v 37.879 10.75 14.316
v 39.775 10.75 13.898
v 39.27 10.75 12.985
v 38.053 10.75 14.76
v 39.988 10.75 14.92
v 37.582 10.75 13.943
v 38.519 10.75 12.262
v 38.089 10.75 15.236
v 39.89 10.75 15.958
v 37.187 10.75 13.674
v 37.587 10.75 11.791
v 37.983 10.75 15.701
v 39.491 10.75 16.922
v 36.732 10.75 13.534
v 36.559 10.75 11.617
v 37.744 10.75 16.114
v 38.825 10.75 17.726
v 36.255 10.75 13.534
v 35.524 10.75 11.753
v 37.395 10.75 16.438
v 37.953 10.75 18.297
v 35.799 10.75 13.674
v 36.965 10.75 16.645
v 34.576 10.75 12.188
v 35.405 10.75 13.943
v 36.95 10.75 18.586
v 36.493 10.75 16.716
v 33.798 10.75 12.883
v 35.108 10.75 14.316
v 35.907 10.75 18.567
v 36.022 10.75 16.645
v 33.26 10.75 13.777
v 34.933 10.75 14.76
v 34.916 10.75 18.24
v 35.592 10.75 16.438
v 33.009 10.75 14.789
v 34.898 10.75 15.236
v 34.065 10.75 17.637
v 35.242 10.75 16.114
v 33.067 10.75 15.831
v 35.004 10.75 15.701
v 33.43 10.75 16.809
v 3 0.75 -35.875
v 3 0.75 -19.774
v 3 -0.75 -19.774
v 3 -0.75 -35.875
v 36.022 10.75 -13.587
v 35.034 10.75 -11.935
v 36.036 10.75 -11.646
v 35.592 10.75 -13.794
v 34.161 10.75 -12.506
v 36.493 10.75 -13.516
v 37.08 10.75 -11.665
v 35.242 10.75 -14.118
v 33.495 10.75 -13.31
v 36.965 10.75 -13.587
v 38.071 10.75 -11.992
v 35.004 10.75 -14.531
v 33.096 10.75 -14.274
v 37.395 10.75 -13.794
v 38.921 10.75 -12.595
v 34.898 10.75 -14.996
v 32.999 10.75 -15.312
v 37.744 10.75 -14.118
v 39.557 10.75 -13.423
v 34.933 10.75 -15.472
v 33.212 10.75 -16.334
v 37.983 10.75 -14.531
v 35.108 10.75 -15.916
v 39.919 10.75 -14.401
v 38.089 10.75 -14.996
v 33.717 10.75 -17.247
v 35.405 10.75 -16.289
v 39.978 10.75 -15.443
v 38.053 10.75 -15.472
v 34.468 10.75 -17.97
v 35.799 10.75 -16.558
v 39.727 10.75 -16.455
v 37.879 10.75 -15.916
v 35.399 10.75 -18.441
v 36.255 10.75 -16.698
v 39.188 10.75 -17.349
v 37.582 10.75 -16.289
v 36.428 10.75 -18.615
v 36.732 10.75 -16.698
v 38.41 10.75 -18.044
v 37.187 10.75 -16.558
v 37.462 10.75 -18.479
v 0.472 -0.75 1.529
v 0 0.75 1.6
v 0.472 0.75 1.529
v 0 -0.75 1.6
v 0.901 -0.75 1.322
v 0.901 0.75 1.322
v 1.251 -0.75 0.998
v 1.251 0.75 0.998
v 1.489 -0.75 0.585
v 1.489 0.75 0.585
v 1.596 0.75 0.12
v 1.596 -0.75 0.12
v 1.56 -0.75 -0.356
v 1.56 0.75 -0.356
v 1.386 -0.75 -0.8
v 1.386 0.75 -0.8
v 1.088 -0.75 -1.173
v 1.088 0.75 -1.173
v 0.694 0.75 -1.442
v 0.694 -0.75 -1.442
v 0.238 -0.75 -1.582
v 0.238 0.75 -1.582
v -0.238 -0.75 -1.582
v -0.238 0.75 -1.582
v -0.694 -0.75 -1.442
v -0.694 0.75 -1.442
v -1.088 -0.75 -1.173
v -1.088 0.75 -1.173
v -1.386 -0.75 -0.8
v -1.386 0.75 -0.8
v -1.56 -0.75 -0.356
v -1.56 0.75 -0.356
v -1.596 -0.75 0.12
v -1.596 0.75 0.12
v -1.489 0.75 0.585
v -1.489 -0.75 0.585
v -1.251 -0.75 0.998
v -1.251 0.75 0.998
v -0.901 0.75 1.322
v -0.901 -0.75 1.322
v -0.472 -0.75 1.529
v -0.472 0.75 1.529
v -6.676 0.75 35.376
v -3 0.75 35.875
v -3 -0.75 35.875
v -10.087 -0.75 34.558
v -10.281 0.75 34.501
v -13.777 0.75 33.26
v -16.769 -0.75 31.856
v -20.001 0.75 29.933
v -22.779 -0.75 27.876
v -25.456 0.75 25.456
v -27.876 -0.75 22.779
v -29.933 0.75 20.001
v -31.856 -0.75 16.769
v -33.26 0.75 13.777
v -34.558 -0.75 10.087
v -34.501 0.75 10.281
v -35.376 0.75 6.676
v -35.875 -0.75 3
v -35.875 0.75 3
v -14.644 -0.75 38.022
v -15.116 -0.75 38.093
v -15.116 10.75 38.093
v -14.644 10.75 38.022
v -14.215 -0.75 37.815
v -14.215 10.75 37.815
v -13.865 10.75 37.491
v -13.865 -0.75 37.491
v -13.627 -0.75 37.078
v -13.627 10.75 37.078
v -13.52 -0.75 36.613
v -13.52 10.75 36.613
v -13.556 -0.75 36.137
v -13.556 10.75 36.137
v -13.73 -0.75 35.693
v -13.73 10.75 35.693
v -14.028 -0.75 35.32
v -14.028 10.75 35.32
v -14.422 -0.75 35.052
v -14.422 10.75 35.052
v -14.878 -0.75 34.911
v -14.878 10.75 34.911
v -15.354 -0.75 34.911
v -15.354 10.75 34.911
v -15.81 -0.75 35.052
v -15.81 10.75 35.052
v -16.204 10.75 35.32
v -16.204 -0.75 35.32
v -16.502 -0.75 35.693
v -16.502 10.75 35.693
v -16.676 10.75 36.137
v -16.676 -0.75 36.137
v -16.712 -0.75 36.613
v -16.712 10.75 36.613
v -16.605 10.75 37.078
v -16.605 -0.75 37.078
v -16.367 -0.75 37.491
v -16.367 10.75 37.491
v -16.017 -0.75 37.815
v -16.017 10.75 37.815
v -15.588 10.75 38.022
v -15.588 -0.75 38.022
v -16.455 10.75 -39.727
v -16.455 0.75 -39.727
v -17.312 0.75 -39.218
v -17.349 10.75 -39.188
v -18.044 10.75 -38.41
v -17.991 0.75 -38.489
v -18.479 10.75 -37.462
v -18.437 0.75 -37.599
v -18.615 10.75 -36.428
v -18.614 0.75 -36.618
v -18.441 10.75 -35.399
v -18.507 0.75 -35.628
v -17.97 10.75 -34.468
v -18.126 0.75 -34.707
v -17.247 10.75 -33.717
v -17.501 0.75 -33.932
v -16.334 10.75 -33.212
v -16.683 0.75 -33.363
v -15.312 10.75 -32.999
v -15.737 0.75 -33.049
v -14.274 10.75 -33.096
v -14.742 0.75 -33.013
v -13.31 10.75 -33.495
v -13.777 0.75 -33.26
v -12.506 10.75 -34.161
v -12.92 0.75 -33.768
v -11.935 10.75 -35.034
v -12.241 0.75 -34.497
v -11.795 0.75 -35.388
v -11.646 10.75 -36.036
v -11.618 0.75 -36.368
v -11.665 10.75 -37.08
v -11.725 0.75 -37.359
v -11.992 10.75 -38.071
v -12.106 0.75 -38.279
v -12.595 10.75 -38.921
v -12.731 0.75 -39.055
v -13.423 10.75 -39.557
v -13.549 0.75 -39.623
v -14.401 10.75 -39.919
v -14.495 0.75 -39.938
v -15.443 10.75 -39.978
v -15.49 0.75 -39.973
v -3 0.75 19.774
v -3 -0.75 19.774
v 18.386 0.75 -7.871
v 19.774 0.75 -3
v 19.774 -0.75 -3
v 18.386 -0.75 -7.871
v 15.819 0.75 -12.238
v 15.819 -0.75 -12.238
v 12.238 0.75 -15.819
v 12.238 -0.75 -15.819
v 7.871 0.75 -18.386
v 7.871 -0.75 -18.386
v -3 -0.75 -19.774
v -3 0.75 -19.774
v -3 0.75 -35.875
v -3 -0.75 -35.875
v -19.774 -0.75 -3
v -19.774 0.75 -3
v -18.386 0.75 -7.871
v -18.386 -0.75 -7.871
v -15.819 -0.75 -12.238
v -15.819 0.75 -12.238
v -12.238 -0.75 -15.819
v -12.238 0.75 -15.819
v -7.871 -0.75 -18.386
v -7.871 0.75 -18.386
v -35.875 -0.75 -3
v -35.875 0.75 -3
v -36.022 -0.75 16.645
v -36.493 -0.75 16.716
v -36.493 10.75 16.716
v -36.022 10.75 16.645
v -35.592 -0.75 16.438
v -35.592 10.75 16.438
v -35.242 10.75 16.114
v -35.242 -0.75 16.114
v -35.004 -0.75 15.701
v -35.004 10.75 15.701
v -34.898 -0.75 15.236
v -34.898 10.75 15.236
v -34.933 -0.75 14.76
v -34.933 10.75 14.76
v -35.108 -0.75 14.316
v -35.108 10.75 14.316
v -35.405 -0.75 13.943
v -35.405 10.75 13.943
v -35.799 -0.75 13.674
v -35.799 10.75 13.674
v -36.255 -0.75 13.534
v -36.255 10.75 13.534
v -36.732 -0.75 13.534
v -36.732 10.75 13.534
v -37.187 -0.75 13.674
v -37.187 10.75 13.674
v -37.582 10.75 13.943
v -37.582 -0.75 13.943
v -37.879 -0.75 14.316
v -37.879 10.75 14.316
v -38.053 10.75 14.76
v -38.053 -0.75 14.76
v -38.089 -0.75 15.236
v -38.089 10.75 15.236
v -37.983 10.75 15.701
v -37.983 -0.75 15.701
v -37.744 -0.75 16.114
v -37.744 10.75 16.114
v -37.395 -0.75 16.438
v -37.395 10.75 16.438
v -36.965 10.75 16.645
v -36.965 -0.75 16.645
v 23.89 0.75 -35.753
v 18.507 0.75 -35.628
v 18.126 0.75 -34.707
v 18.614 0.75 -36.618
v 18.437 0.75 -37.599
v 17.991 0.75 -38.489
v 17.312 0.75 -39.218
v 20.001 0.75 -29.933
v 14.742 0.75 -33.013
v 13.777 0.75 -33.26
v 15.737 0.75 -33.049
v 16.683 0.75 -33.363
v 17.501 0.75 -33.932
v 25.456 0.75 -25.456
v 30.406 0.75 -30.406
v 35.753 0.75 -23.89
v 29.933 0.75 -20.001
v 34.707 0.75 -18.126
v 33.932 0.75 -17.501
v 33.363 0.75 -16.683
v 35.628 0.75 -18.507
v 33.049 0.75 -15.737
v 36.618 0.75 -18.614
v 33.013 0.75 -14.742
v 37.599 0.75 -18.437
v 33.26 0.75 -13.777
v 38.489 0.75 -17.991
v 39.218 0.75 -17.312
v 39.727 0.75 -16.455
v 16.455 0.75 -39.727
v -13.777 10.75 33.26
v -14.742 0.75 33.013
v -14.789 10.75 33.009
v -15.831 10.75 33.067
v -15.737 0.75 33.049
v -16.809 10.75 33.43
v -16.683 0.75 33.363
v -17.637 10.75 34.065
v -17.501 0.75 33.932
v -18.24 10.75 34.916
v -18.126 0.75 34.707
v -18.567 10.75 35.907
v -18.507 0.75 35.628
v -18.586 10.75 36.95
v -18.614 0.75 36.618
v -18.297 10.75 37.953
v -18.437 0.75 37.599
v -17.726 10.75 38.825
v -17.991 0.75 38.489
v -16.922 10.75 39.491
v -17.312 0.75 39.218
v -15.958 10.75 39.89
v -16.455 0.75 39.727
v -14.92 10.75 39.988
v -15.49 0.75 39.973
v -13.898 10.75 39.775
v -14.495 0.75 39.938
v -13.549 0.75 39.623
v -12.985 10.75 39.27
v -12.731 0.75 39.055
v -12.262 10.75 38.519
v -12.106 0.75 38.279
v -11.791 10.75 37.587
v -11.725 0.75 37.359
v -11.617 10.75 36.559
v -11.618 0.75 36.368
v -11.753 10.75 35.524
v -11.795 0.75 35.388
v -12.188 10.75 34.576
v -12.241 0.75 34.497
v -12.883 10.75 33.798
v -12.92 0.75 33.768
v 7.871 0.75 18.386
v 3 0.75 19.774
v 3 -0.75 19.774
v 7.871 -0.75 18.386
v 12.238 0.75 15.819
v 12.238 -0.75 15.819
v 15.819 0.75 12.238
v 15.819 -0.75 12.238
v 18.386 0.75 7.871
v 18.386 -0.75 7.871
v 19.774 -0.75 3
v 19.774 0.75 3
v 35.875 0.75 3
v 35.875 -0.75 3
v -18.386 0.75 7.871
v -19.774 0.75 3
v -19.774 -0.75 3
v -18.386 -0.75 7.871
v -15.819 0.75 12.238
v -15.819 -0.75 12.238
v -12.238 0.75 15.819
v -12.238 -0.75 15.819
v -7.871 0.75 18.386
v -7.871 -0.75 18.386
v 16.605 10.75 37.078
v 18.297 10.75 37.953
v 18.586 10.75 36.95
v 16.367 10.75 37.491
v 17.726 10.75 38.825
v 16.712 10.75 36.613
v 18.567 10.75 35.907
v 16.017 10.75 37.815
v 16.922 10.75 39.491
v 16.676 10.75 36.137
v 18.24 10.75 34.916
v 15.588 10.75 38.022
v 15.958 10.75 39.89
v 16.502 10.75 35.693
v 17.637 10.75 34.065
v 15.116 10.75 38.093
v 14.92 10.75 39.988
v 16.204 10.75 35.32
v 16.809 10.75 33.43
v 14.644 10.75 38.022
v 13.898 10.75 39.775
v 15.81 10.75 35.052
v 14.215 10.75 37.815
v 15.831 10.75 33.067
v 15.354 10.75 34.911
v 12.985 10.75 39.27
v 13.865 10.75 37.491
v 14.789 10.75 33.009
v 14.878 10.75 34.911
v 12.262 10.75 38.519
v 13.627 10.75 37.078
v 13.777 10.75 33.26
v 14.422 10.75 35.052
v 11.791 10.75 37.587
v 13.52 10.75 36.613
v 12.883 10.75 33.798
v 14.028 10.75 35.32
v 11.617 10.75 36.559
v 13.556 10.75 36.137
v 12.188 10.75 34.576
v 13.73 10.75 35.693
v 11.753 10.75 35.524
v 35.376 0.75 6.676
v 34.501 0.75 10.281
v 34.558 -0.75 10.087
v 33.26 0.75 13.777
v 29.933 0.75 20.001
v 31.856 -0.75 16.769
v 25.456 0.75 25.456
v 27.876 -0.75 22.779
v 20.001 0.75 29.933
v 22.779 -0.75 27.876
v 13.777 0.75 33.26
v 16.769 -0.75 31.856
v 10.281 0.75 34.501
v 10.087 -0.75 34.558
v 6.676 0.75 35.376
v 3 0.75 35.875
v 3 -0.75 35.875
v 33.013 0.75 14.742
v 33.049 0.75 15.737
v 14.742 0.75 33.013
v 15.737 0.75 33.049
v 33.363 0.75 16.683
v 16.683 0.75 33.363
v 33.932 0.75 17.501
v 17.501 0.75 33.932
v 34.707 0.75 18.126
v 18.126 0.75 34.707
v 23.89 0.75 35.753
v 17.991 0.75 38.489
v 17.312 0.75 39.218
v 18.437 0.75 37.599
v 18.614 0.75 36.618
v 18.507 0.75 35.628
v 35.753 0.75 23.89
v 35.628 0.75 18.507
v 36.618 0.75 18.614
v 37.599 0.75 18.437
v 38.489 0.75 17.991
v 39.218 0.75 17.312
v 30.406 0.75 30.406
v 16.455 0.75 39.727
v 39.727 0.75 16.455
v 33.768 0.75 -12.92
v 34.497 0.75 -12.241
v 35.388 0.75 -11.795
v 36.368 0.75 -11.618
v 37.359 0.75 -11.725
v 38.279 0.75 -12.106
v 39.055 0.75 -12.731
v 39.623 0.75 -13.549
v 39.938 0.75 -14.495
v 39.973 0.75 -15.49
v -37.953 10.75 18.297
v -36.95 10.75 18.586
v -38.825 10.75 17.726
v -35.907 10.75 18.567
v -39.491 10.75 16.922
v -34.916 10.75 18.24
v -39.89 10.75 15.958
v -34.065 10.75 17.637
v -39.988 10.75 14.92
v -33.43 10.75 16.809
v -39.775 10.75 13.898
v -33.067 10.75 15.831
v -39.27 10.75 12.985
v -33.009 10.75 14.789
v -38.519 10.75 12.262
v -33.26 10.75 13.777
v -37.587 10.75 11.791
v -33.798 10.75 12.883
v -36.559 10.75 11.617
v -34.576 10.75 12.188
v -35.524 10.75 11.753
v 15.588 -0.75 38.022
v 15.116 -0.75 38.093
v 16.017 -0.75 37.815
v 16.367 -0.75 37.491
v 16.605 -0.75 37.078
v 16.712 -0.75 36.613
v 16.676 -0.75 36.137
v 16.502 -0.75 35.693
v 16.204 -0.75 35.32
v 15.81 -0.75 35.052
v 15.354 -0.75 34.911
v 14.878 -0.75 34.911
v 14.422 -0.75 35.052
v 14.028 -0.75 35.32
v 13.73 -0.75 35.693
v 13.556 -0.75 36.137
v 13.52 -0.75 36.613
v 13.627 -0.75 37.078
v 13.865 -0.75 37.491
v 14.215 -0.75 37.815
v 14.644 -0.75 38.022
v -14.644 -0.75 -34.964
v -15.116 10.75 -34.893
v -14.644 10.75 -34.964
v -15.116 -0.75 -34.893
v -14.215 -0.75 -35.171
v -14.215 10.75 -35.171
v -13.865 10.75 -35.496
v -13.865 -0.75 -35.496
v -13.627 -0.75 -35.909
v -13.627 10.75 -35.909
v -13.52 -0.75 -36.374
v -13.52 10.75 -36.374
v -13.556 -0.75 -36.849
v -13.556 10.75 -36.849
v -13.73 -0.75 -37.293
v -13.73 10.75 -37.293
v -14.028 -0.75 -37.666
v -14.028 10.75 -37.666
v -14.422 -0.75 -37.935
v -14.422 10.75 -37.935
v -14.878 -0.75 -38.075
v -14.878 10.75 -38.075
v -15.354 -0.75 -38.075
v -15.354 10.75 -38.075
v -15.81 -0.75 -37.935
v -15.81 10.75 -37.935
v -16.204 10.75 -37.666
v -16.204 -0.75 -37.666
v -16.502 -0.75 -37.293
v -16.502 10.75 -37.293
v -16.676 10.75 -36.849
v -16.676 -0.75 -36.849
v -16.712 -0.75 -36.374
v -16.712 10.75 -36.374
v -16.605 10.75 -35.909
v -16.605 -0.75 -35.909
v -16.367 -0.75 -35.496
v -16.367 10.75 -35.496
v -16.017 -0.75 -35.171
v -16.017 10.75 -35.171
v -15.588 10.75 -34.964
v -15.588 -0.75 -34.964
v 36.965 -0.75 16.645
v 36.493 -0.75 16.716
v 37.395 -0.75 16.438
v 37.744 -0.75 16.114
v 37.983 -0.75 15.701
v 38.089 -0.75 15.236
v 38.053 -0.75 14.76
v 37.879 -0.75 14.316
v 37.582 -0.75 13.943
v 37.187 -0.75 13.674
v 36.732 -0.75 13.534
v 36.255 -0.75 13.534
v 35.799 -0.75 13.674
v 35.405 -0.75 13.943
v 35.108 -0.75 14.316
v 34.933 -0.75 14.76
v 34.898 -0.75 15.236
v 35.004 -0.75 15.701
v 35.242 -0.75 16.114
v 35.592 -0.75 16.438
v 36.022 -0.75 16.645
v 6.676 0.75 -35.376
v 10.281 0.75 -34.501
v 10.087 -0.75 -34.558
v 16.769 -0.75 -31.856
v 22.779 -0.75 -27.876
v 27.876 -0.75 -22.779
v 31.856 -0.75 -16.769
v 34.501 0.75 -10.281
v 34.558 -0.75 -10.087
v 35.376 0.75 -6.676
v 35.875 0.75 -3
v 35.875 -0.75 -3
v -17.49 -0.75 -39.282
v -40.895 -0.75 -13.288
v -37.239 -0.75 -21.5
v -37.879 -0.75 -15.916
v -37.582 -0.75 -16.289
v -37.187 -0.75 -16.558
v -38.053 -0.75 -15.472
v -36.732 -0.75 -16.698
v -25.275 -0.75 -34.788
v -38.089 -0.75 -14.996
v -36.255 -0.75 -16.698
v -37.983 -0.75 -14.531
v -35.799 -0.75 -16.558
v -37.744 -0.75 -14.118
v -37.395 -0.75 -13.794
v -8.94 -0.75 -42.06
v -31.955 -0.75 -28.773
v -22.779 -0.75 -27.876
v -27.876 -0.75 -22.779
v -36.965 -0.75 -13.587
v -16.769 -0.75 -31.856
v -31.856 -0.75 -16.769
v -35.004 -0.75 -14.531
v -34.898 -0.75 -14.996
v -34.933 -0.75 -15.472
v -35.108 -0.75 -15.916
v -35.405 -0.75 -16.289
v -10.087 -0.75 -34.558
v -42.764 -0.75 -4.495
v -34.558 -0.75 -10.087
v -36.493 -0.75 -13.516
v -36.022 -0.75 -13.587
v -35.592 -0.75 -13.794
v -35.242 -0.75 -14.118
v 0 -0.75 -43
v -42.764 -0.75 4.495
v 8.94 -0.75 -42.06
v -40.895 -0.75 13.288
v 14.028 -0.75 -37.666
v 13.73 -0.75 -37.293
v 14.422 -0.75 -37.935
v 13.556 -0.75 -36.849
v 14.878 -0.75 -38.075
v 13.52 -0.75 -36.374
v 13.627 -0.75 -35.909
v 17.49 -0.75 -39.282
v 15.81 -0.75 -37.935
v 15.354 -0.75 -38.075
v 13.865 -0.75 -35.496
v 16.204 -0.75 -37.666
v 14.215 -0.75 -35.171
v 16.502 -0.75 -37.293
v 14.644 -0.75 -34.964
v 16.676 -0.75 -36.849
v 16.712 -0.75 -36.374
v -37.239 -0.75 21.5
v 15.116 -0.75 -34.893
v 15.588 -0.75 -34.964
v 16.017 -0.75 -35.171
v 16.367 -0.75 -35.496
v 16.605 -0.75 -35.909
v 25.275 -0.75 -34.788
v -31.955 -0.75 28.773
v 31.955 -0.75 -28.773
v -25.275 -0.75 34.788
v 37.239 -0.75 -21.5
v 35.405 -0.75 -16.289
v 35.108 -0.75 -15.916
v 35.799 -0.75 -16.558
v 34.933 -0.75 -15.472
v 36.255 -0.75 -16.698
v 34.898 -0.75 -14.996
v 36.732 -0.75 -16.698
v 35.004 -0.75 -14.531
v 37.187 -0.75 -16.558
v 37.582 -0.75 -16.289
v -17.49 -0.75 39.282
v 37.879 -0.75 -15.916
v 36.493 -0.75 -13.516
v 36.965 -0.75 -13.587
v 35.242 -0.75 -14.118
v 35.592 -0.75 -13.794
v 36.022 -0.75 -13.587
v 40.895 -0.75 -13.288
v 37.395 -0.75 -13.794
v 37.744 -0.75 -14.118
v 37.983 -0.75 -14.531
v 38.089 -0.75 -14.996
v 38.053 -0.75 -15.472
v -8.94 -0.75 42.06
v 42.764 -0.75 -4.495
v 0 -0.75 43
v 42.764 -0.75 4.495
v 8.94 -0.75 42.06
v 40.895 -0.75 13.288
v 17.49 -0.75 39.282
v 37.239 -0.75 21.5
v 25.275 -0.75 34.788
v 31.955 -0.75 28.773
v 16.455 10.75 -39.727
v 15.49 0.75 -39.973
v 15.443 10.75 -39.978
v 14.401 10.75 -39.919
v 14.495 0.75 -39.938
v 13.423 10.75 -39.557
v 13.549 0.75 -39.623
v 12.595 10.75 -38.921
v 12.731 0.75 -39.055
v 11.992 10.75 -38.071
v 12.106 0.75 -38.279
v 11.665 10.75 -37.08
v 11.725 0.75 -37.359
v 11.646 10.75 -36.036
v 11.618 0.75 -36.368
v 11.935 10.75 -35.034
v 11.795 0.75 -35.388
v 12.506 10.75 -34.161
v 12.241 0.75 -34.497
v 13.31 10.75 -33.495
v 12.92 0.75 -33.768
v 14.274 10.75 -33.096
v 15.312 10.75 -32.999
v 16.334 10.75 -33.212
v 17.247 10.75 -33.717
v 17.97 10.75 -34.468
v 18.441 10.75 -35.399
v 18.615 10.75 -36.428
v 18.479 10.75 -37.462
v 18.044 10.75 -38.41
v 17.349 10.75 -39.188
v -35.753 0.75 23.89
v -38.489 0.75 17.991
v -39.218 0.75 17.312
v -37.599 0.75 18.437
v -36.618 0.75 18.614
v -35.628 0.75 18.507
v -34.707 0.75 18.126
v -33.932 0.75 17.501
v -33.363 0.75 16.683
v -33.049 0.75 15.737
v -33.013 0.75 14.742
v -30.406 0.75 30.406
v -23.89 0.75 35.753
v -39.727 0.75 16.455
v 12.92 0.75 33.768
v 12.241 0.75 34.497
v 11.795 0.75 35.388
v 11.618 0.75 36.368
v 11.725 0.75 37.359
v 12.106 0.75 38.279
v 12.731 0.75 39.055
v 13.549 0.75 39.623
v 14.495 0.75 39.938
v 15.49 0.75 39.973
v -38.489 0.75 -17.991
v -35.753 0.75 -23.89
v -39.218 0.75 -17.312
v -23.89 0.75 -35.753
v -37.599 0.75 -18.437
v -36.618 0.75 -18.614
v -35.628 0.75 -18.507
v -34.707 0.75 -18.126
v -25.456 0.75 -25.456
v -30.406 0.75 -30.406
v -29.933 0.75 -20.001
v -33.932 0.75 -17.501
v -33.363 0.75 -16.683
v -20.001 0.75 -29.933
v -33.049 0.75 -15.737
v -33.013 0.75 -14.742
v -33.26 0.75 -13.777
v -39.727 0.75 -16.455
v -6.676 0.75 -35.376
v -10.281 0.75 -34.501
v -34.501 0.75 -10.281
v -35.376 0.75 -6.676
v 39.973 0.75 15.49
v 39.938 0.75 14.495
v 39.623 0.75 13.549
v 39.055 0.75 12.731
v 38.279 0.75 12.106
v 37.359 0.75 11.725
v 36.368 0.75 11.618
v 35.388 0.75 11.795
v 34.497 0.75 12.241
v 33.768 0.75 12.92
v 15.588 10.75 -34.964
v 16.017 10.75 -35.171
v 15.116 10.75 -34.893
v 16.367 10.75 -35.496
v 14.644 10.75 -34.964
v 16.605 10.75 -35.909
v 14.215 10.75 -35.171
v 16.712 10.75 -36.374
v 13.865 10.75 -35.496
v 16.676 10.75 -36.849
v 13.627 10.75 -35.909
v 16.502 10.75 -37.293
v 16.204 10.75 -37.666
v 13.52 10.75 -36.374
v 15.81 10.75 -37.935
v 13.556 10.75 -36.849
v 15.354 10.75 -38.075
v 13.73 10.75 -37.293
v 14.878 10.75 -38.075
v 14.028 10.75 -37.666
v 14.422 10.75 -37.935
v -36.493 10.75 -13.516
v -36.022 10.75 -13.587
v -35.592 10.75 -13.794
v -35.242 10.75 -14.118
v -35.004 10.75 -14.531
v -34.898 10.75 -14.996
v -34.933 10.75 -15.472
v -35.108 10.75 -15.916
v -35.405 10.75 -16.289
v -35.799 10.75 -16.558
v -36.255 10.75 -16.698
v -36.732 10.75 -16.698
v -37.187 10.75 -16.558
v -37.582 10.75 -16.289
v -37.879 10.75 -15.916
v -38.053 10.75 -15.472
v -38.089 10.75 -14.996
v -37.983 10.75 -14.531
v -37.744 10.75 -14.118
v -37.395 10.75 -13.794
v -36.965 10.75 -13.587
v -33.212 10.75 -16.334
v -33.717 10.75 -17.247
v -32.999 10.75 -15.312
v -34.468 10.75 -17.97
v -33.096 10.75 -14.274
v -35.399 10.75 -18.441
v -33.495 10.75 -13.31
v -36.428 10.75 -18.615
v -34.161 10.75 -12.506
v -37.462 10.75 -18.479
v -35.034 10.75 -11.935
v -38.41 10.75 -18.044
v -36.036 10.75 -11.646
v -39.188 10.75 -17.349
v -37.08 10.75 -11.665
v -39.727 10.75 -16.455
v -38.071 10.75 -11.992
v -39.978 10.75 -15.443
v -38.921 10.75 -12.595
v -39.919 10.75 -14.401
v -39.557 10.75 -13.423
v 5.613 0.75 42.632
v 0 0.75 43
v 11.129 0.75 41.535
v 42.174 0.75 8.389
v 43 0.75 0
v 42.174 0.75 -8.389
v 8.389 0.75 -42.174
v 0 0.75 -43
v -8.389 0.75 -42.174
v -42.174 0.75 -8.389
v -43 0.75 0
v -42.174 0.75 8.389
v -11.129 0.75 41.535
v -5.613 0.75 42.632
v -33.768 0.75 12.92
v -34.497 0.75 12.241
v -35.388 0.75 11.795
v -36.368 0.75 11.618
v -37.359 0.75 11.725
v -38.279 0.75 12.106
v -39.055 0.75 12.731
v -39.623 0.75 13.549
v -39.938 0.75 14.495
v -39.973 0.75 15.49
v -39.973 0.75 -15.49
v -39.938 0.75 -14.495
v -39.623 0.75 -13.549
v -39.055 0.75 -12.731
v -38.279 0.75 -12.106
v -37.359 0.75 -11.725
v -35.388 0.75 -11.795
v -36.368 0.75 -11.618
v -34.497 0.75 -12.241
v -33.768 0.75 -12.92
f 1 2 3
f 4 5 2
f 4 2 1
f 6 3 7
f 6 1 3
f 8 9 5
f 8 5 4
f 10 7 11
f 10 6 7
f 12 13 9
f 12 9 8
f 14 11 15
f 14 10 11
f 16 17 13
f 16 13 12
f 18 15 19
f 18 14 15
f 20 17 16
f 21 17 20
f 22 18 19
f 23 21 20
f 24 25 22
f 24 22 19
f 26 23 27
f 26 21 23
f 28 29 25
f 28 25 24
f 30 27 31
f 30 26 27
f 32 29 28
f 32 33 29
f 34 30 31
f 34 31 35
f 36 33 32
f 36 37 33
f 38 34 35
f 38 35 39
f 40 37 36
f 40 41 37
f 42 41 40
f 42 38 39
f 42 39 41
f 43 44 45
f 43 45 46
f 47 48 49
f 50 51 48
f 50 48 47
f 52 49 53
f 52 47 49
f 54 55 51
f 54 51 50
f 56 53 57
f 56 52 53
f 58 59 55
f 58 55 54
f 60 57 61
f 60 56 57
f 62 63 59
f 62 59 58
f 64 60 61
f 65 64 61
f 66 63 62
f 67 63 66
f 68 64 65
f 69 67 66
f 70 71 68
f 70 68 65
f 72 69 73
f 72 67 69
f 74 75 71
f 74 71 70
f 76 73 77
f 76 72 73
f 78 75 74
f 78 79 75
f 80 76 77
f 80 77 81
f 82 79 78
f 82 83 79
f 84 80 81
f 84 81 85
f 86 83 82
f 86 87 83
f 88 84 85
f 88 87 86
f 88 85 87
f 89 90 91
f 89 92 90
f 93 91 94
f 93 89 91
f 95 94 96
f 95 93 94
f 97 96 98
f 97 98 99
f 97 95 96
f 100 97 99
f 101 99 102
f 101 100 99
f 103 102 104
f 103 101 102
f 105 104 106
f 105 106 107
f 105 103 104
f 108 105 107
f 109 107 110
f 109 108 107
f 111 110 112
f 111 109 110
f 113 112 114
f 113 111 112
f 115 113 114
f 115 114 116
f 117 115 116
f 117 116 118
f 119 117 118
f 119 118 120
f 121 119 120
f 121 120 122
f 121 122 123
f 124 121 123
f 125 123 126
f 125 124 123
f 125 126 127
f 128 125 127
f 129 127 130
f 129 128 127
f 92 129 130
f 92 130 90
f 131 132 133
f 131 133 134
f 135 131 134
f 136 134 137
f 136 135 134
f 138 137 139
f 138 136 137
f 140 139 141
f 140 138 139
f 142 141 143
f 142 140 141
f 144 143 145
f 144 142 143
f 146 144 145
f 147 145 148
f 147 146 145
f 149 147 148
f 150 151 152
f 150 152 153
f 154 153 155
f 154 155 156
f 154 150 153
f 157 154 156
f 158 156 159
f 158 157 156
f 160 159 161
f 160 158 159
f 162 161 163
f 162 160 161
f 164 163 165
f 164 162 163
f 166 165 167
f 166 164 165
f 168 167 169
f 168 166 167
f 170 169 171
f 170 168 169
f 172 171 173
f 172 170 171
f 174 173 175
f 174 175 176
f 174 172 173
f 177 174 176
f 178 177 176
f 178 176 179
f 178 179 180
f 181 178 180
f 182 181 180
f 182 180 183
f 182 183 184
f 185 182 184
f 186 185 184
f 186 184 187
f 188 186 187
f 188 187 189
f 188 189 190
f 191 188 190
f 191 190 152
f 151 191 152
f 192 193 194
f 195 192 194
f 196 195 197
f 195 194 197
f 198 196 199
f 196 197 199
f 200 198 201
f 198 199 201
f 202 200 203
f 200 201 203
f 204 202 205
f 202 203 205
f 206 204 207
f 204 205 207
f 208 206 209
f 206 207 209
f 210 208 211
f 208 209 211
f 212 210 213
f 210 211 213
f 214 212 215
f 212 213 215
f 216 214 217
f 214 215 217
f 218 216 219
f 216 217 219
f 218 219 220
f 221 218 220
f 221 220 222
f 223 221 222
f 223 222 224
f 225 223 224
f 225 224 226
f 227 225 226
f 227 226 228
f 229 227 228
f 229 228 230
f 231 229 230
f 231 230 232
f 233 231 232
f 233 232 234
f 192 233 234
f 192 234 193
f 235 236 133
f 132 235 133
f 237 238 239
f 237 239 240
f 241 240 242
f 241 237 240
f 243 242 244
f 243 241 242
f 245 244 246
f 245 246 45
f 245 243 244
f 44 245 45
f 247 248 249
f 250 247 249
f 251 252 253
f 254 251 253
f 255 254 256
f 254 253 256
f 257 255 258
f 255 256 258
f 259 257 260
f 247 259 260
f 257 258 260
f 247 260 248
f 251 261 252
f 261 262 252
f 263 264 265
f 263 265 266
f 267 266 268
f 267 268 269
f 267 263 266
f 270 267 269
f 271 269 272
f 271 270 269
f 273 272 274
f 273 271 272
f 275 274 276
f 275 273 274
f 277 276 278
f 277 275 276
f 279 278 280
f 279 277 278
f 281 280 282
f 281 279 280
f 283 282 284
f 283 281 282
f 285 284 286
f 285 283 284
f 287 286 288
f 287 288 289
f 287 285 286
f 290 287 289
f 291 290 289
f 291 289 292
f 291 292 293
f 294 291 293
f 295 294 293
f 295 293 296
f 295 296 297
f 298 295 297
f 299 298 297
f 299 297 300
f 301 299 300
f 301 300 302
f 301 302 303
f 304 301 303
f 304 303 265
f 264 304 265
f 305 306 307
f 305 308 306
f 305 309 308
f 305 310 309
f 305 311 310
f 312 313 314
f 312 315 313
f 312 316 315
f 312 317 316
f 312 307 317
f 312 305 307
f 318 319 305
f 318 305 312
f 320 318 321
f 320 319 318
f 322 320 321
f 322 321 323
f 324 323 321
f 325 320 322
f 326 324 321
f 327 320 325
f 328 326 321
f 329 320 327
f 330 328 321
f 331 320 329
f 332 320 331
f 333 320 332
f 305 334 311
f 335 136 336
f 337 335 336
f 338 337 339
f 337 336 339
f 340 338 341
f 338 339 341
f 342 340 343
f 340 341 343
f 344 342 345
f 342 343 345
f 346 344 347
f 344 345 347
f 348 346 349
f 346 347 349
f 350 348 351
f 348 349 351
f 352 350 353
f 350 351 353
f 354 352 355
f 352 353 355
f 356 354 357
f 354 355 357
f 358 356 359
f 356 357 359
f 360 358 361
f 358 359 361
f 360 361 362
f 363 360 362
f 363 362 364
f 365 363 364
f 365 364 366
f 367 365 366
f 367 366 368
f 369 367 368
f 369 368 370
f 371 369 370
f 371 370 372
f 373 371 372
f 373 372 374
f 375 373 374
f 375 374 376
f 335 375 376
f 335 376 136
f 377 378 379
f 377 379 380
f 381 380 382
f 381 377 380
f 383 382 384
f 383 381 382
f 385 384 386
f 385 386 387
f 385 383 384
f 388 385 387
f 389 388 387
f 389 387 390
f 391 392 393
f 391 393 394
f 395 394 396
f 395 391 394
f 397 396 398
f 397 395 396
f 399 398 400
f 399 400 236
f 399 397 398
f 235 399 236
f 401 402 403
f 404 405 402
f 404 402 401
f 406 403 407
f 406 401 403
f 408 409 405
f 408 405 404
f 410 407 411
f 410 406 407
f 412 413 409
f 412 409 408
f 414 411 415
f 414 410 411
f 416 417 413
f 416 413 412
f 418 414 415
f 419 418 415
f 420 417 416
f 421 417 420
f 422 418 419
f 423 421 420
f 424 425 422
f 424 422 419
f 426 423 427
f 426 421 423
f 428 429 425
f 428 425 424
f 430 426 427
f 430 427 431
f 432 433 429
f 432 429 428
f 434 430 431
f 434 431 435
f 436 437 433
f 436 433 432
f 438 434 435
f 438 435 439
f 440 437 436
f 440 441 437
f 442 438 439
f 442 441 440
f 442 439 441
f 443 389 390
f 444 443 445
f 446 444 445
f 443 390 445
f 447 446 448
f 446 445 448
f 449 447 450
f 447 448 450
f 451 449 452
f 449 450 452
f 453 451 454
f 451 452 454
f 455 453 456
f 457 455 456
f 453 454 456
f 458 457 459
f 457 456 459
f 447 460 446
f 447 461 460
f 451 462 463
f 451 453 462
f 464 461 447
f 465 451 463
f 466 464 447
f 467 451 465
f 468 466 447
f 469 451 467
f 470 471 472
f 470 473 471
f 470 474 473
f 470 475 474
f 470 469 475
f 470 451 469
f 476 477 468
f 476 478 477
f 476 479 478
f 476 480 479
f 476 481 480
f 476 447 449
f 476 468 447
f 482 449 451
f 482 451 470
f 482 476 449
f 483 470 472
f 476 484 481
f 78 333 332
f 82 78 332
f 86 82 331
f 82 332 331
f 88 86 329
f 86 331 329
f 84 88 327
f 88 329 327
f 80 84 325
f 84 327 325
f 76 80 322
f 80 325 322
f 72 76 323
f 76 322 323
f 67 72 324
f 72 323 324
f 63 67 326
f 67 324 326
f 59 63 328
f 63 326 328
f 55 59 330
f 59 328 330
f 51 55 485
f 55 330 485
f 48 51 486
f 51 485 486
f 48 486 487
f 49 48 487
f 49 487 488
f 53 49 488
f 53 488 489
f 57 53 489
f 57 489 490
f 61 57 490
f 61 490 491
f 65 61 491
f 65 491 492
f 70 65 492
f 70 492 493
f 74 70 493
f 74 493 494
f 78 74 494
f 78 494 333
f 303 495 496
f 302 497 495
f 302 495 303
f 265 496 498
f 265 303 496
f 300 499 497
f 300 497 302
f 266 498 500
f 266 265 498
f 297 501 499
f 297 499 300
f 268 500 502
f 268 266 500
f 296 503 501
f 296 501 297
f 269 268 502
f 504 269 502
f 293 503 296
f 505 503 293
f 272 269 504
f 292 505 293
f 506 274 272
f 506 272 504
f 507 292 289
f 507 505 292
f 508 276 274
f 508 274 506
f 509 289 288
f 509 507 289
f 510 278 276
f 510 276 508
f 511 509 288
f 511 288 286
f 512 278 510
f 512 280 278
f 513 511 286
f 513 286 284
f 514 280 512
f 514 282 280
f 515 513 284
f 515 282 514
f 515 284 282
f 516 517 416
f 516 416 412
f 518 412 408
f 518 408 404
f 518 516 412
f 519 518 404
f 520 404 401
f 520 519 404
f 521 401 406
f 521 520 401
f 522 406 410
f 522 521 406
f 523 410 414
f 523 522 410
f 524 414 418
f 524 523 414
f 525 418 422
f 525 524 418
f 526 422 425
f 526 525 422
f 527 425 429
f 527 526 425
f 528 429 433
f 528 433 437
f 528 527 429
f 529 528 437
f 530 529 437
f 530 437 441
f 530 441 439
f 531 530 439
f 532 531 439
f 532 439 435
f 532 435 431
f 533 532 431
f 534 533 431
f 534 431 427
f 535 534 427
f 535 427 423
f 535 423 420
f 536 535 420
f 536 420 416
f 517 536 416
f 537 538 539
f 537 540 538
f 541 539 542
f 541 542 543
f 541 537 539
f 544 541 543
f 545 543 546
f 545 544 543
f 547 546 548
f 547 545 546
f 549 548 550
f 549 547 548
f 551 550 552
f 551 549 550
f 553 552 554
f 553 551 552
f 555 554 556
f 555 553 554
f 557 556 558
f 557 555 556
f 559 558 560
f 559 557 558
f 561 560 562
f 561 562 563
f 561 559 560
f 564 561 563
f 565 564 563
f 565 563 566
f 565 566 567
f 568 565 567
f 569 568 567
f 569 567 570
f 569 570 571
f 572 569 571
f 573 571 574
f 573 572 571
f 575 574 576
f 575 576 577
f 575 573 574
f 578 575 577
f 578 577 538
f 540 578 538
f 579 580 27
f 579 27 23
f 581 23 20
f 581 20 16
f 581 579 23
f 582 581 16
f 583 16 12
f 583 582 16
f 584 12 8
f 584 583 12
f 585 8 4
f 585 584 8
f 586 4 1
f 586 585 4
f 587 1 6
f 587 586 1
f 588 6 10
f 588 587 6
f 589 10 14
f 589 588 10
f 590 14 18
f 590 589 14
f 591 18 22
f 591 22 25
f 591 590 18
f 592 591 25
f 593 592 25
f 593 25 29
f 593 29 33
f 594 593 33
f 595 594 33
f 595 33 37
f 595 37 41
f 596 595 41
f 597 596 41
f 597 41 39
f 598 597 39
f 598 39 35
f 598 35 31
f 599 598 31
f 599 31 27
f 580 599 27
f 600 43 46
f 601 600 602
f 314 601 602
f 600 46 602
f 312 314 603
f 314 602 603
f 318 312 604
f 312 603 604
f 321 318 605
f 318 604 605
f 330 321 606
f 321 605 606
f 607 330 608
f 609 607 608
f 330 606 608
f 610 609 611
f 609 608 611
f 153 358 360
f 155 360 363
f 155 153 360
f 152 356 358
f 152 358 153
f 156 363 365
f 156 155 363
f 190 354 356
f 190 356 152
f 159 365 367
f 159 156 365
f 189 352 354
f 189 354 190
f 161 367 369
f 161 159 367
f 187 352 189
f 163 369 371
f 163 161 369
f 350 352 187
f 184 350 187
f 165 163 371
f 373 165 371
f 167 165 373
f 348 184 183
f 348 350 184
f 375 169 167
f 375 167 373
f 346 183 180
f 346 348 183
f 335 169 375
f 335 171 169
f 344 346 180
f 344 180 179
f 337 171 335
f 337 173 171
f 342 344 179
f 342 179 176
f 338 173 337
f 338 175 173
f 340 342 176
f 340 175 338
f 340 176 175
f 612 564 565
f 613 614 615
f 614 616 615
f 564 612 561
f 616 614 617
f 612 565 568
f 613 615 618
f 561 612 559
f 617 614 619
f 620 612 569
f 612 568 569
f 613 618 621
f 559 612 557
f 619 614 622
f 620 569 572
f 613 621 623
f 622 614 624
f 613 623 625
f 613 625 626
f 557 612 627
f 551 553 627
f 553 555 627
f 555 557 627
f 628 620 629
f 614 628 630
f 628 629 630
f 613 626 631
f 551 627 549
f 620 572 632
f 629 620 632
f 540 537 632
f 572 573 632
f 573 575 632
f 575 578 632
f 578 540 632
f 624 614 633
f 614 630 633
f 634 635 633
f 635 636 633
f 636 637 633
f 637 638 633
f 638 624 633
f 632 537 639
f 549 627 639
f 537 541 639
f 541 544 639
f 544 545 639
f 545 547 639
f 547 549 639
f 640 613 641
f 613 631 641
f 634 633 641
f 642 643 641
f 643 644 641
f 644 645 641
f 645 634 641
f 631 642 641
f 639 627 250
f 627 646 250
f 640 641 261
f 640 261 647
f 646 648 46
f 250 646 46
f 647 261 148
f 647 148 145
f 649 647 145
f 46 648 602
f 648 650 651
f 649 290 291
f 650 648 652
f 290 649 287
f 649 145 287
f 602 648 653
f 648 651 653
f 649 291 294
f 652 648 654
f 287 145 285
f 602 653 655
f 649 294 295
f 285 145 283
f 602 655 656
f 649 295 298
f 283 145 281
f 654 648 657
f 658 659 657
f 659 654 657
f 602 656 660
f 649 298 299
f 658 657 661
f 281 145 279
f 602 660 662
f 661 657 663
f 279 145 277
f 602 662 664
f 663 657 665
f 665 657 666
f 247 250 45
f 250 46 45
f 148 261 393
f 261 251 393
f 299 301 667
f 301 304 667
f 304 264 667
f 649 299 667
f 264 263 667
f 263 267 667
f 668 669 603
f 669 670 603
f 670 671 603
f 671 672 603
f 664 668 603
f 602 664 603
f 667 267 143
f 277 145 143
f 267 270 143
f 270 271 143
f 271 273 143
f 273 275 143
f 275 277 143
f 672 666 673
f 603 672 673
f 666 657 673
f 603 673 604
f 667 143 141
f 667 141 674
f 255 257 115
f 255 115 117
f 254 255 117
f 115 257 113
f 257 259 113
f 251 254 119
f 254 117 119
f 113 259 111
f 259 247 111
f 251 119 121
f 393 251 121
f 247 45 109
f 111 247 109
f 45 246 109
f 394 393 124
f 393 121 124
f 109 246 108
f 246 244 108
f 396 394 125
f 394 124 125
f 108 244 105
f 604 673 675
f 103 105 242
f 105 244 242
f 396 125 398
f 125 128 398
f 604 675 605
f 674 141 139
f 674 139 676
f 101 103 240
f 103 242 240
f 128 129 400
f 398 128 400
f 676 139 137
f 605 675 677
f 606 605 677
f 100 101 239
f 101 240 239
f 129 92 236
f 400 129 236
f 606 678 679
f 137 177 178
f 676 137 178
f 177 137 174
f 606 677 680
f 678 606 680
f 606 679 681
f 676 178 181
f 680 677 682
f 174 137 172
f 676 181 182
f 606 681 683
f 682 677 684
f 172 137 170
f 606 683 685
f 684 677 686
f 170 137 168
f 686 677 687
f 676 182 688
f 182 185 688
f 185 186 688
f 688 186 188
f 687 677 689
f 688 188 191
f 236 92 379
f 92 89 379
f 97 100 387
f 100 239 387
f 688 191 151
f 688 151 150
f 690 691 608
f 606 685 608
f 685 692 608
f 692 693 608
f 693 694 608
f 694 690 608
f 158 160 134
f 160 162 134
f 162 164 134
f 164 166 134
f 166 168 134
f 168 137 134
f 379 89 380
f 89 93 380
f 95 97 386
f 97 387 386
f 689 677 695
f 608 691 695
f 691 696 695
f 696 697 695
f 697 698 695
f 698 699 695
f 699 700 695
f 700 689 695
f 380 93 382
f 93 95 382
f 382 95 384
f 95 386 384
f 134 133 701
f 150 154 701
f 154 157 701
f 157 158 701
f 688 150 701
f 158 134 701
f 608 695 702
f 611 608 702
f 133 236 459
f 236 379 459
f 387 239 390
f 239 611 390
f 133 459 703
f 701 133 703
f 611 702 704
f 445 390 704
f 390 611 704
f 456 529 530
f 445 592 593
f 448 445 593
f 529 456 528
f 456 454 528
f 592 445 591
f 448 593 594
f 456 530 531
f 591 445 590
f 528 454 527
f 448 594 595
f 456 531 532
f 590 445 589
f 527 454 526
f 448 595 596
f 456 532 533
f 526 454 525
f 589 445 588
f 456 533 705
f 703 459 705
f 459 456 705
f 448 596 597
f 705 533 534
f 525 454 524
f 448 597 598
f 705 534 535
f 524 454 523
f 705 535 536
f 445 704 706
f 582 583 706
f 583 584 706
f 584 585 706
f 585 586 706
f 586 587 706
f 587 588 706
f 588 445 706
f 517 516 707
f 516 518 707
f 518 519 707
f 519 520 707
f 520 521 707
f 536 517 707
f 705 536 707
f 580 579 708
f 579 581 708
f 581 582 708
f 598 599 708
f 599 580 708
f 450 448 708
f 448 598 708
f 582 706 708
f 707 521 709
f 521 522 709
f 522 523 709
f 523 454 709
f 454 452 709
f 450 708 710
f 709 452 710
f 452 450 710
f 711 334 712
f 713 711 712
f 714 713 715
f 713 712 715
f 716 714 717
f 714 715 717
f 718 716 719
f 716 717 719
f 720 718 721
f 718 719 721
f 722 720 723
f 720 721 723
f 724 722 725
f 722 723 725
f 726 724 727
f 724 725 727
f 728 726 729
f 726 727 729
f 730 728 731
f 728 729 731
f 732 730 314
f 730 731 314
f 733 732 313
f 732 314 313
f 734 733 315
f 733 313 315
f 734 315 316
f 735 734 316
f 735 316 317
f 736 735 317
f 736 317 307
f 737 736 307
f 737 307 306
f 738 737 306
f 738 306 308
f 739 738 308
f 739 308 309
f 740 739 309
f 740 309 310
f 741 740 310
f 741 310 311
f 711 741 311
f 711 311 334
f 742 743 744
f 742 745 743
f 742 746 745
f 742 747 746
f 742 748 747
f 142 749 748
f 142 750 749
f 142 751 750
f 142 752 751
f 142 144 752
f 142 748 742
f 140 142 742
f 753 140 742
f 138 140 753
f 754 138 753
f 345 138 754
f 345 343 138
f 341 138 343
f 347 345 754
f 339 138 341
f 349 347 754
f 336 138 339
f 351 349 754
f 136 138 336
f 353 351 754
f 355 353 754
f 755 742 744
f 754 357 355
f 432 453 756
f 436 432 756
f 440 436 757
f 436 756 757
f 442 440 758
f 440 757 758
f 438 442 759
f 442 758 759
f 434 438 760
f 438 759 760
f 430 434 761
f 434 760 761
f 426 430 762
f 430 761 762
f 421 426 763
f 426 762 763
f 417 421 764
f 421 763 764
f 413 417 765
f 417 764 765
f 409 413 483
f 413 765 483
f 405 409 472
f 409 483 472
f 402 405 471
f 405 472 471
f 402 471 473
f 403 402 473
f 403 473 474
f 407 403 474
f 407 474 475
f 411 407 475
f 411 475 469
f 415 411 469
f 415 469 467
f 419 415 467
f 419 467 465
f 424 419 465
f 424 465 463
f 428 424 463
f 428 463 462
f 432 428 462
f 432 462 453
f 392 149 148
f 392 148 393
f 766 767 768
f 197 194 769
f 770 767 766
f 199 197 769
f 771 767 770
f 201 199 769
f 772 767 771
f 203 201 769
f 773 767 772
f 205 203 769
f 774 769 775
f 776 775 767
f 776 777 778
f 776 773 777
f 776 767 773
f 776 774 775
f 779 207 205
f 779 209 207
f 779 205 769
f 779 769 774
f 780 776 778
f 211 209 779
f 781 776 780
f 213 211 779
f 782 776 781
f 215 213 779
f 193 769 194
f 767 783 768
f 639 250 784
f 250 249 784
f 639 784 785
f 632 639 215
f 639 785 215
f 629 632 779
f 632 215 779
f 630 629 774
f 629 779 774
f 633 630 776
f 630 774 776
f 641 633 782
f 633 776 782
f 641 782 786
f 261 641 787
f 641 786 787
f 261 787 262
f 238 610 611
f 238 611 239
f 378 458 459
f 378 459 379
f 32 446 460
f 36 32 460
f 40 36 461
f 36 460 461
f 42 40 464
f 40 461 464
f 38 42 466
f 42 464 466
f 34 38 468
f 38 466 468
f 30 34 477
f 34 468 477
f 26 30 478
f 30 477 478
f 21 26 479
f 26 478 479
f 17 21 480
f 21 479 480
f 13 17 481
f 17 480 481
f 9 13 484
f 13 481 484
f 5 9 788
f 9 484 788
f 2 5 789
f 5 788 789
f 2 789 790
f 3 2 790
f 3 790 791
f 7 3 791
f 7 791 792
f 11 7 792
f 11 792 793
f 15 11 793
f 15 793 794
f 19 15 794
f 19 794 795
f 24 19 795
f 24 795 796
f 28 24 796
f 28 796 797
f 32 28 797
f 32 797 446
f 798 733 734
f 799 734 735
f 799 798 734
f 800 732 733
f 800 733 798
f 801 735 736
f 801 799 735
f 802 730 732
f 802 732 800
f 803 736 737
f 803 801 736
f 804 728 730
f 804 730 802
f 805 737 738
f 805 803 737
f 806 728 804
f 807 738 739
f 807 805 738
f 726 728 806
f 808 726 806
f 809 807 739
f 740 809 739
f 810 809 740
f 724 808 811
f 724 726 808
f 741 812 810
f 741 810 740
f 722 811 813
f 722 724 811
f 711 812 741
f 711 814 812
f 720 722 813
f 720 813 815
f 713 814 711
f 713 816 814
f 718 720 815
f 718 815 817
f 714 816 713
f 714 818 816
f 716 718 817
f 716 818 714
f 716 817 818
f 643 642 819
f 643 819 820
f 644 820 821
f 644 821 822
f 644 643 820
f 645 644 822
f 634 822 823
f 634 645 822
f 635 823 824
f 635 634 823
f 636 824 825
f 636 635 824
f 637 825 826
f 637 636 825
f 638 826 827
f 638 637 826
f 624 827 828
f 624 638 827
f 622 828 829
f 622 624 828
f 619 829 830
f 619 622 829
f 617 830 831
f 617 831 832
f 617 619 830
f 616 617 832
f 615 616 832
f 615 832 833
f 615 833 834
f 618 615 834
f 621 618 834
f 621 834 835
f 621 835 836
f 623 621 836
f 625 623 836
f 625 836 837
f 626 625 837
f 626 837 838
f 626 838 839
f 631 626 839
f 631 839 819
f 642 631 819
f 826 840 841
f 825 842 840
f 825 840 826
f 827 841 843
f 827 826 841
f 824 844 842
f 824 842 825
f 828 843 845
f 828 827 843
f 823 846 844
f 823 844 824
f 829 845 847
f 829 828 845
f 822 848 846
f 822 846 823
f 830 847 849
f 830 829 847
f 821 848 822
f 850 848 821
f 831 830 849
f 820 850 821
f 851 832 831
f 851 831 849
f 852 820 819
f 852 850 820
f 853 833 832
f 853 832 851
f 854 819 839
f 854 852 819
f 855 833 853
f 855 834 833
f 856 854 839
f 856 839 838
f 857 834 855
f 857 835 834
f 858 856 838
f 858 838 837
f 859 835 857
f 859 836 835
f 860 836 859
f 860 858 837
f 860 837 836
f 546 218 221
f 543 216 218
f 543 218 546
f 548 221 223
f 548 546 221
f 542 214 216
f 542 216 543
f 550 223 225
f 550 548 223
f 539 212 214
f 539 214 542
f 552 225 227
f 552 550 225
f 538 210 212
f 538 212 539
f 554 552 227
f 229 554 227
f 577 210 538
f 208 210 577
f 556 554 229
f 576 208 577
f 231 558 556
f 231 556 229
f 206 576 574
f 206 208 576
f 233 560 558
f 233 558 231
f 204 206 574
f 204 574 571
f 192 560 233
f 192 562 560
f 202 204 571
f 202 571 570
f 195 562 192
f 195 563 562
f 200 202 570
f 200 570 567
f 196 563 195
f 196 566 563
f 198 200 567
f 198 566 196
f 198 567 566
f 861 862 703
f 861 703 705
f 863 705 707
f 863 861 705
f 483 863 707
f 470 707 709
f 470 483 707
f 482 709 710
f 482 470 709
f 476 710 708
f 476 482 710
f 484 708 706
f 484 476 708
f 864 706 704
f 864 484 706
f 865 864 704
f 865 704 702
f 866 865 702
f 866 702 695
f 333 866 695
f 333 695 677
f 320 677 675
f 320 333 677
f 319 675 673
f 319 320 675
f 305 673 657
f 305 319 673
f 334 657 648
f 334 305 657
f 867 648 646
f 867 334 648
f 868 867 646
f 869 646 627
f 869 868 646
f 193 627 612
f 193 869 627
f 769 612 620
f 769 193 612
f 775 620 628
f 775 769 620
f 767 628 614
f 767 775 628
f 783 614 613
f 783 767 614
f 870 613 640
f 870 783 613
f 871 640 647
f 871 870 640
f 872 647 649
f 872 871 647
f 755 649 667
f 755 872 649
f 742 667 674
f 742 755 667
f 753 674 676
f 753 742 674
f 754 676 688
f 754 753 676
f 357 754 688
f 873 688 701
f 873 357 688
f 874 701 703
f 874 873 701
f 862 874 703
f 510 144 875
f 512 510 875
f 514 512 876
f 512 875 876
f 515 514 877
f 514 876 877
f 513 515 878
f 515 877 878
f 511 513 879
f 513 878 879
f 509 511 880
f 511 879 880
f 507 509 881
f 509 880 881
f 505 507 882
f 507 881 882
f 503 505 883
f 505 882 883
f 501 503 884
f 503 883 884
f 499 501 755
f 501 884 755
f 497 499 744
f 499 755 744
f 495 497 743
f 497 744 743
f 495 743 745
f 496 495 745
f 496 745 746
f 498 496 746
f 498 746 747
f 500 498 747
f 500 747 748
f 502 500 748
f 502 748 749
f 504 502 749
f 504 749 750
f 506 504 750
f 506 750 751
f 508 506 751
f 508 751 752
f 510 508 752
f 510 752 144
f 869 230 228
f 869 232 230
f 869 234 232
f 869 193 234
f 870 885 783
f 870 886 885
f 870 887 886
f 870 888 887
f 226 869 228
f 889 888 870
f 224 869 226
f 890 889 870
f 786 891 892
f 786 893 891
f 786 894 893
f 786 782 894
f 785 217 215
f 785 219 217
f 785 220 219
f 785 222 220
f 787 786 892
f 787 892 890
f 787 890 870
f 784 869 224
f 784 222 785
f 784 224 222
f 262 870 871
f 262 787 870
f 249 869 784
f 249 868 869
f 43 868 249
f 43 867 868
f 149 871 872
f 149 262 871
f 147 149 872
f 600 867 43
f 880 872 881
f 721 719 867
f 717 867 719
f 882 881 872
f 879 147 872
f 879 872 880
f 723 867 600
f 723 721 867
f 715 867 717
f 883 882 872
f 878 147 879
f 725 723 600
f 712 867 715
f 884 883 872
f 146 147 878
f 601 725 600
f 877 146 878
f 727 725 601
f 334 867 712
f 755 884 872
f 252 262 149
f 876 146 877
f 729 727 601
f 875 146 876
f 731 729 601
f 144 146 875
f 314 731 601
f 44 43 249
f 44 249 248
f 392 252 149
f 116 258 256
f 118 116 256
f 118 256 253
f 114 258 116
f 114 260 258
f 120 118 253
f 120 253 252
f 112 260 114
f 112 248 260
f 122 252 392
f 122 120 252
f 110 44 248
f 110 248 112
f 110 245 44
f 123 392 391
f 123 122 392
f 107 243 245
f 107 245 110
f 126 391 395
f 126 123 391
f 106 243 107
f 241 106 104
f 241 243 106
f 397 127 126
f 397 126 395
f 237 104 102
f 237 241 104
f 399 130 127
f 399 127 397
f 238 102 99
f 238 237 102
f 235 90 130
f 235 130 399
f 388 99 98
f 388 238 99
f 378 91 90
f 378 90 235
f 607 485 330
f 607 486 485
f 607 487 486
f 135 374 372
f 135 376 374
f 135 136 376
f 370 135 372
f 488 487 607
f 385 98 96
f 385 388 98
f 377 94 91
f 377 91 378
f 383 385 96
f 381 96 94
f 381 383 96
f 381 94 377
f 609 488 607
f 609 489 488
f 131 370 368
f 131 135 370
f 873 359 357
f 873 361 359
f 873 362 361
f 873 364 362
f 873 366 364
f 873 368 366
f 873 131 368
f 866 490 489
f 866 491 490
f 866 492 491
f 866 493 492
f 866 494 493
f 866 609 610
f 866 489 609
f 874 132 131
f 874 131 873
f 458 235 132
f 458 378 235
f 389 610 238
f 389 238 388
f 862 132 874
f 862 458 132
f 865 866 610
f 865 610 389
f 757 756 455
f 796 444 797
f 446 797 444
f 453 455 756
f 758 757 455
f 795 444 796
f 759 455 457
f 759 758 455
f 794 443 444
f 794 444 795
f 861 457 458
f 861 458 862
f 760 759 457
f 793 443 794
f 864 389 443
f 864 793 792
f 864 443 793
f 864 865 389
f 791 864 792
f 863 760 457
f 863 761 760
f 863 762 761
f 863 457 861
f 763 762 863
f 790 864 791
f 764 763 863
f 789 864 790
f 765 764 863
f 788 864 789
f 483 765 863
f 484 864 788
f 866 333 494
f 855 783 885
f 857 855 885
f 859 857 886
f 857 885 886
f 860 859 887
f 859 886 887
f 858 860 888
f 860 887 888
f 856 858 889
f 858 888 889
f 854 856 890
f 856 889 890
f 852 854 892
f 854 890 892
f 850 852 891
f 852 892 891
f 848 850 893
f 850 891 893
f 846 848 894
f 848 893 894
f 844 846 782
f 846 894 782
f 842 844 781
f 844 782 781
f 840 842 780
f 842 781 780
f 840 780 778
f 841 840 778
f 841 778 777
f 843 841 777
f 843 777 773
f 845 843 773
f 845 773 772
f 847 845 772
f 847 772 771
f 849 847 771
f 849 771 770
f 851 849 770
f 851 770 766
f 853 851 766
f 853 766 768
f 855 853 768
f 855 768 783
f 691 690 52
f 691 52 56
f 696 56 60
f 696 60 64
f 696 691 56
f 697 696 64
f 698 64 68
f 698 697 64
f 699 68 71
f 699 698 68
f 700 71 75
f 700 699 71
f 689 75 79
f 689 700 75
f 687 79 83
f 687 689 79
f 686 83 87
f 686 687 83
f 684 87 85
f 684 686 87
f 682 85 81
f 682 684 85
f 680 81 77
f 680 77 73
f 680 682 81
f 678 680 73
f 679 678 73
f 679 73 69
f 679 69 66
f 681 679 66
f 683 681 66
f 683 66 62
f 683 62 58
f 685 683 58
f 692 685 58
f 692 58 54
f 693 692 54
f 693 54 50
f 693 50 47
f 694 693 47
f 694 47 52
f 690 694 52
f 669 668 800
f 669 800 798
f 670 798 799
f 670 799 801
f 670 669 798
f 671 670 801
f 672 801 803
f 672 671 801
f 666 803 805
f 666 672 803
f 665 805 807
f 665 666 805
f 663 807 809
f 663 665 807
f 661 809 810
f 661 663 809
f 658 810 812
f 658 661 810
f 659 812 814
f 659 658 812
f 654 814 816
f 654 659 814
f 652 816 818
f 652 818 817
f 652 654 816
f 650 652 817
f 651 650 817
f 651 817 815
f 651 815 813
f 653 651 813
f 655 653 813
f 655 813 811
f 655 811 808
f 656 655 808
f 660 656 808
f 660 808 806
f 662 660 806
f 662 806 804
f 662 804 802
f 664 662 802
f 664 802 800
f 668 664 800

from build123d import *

# Parameters (mm, degrees)
ESBO_O1_R                = 43
ESBO_O1_R_2              = 1.6
RESSALTO_EXTRUS_O1_DEPTH = 0.75
ESBO_O2_R                = 3.5
ESBO_O2_R_2              = 1.6
RESSALTO_EXTRUS_O3_DEPTH = 10


with BuildPart() as part:
    # Esboço1 → Ressalto-extrusão1 (new, symmetric)
    with BuildSketch(Plane(origin=(0, 0, 0), x_dir=(1, 0, 0), z_dir=(0, 1, 0))):
        with Locations(Location((0, 0, 0), (0, 0, 270))):
            Circle(ESBO_O1_R)
        with Locations(Location((-36.493241534, 15.115995578, 0), (0, 0, 270))):
            Circle(ESBO_O1_R_2, mode=Mode.SUBTRACT)
        with Locations(Location((-15.115995578, 36.493241534, 0), (0, 0, 270))):
            Circle(ESBO_O1_R_2, mode=Mode.SUBTRACT)
        with Locations(Location((15.115995578, 36.493241534, 0), (0, 0, 270))):
            Circle(ESBO_O1_R_2, mode=Mode.SUBTRACT)
        with Locations(Location((36.493241534, 15.115995578, 0), (0, 0, 270))):
            Circle(ESBO_O1_R_2, mode=Mode.SUBTRACT)
        with Locations(Location((36.493241534, -15.115995578, 0), (0, 0, 270))):
            Circle(ESBO_O1_R_2, mode=Mode.SUBTRACT)
        with Locations(Location((15.115995578, -36.493241534, 0), (0, 0, 270))):
            Circle(ESBO_O1_R_2, mode=Mode.SUBTRACT)
        with Locations(Location((-15.115995578, -36.493241534, 0), (0, 0, 270))):
            Circle(ESBO_O1_R_2, mode=Mode.SUBTRACT)
        with Locations(Location((-36.493241534, -15.115995578, 0), (0, 0, 270))):
            Circle(ESBO_O1_R_2, mode=Mode.SUBTRACT)
        with Locations(Location((0, 0, 0), (0, 0, 270))):
            Circle(ESBO_O1_R_2, mode=Mode.SUBTRACT)
        with BuildLine():
            Line((-3, 19.773719933), (-3, 35.874782229))
            ThreePointArc((-3, 35.874782229), (-25.455844123, 25.455844123), (-35.874782229, 3))
            Line((-35.874782229, 3), (-19.773719933, 3))
            ThreePointArc((-19.773719933, 3), (-14.142135624, 14.142135624), (-3, 19.773719933))
        make_face(mode=Mode.SUBTRACT)
        with BuildLine():
            Line((3, 19.773719933), (3, 35.874782229))
            ThreePointArc((3, 35.874782229), (25.455844123, 25.455844123), (35.874782229, 3))
            Line((35.874782229, 3), (19.773719933, 3))
            ThreePointArc((19.773719933, 3), (14.142135624, 14.142135624), (3, 19.773719933))
        make_face(mode=Mode.SUBTRACT)
        with BuildLine():
            Line((19.773719933, -3), (35.874782229, -3))
            ThreePointArc((35.874782229, -3), (25.455844123, -25.455844123), (3, -35.874782229))
            Line((3, -35.874782229), (3, -19.773719933))
            ThreePointArc((3, -19.773719933), (14.142135624, -14.142135624), (19.773719933, -3))
        make_face(mode=Mode.SUBTRACT)
        with BuildLine():
            Line((-3, -19.773719933), (-3, -35.874782229))
            ThreePointArc((-3, -35.874782229), (-25.455844123, -25.455844123), (-35.874782229, -3))
            Line((-35.874782229, -3), (-19.773719933, -3))
            ThreePointArc((-19.773719933, -3), (-14.142135624, -14.142135624), (-3, -19.773719933))
        make_face(mode=Mode.SUBTRACT)
    extrude(amount=RESSALTO_EXTRUS_O1_DEPTH, both=True)

    # Esboço2 → Ressalto-extrusão3 (add)
    # profile 1 of 8: a face of its own
    with BuildSketch(Plane(origin=(0, 0.75, 0), x_dir=(1, 0, 0), z_dir=(0, 1, 0))):
        with Locations(Location((-15.115995578, 36.493241534, 0), (0, 0, 112.5))):
            Circle(ESBO_O2_R)
        with Locations(Location((-15.115995578, 36.493241534, 0), (0, 0, 270))):
            Circle(ESBO_O2_R_2, mode=Mode.SUBTRACT)
    # profile 2 of 8: a face of its own
    with BuildSketch(Plane(origin=(0, 0.75, 0), x_dir=(1, 0, 0), z_dir=(0, 1, 0))):
        with Locations(Location((15.115995578, 36.493241534, 0), (0, 0, 67.5))):
            Circle(ESBO_O2_R)
        with Locations(Location((15.115995578, 36.493241534, 0), (0, 0, 270))):
            Circle(ESBO_O2_R_2, mode=Mode.SUBTRACT)
    # profile 3 of 8: a face of its own
    with BuildSketch(Plane(origin=(0, 0.75, 0), x_dir=(1, 0, 0), z_dir=(0, 1, 0))):
        with Locations(Location((36.493241534, 15.115995578, 0), (0, 0, 22.5))):
            Circle(ESBO_O2_R)
        with Locations(Location((36.493241534, 15.115995578, 0), (0, 0, 270))):
            Circle(ESBO_O2_R_2, mode=Mode.SUBTRACT)
    # profile 4 of 8: a face of its own
    with BuildSketch(Plane(origin=(0, 0.75, 0), x_dir=(1, 0, 0), z_dir=(0, 1, 0))):
        with Locations(Location((36.493241534, -15.115995578, 0), (0, 0, 157.5))):
            Circle(ESBO_O2_R)
        with Locations(Location((36.493241534, -15.115995578, 0), (0, 0, 270))):
            Circle(ESBO_O2_R_2, mode=Mode.SUBTRACT)
    # profile 5 of 8: a face of its own
    with BuildSketch(Plane(origin=(0, 0.75, 0), x_dir=(1, 0, 0), z_dir=(0, 1, 0))):
        with Locations(Location((15.115995578, -36.493241534, 0), (0, 0, 112.5))):
            Circle(ESBO_O2_R)
        with Locations(Location((15.115995578, -36.493241534, 0), (0, 0, 270))):
            Circle(ESBO_O2_R_2, mode=Mode.SUBTRACT)
    # profile 6 of 8: a face of its own
    with BuildSketch(Plane(origin=(0, 0.75, 0), x_dir=(1, 0, 0), z_dir=(0, 1, 0))):
        with Locations(Location((-15.115995578, -36.493241534, 0), (0, 0, 67.5))):
            Circle(ESBO_O2_R)
        with Locations(Location((-15.115995578, -36.493241534, 0), (0, 0, 270))):
            Circle(ESBO_O2_R_2, mode=Mode.SUBTRACT)
    # profile 7 of 8: a face of its own
    with BuildSketch(Plane(origin=(0, 0.75, 0), x_dir=(1, 0, 0), z_dir=(0, 1, 0))):
        with Locations(Location((-36.493241534, -15.115995578, 0), (0, 0, 22.5))):
            Circle(ESBO_O2_R)
        with Locations(Location((-36.493241534, -15.115995578, 0), (0, 0, 270))):
            Circle(ESBO_O2_R_2, mode=Mode.SUBTRACT)
    # profile 8 of 8: a face of its own
    with BuildSketch(Plane(origin=(0, 0.75, 0), x_dir=(1, 0, 0), z_dir=(0, 1, 0))):
        with Locations(Location((-36.493241534, 15.115995578, 0), (0, 0, 157.5))):
            Circle(ESBO_O2_R)
        with Locations(Location((-36.493241534, 15.115995578, 0), (0, 0, 270))):
            Circle(ESBO_O2_R_2, mode=Mode.SUBTRACT)
    extrude(amount=RESSALTO_EXTRUS_O3_DEPTH)


solid = part.part
